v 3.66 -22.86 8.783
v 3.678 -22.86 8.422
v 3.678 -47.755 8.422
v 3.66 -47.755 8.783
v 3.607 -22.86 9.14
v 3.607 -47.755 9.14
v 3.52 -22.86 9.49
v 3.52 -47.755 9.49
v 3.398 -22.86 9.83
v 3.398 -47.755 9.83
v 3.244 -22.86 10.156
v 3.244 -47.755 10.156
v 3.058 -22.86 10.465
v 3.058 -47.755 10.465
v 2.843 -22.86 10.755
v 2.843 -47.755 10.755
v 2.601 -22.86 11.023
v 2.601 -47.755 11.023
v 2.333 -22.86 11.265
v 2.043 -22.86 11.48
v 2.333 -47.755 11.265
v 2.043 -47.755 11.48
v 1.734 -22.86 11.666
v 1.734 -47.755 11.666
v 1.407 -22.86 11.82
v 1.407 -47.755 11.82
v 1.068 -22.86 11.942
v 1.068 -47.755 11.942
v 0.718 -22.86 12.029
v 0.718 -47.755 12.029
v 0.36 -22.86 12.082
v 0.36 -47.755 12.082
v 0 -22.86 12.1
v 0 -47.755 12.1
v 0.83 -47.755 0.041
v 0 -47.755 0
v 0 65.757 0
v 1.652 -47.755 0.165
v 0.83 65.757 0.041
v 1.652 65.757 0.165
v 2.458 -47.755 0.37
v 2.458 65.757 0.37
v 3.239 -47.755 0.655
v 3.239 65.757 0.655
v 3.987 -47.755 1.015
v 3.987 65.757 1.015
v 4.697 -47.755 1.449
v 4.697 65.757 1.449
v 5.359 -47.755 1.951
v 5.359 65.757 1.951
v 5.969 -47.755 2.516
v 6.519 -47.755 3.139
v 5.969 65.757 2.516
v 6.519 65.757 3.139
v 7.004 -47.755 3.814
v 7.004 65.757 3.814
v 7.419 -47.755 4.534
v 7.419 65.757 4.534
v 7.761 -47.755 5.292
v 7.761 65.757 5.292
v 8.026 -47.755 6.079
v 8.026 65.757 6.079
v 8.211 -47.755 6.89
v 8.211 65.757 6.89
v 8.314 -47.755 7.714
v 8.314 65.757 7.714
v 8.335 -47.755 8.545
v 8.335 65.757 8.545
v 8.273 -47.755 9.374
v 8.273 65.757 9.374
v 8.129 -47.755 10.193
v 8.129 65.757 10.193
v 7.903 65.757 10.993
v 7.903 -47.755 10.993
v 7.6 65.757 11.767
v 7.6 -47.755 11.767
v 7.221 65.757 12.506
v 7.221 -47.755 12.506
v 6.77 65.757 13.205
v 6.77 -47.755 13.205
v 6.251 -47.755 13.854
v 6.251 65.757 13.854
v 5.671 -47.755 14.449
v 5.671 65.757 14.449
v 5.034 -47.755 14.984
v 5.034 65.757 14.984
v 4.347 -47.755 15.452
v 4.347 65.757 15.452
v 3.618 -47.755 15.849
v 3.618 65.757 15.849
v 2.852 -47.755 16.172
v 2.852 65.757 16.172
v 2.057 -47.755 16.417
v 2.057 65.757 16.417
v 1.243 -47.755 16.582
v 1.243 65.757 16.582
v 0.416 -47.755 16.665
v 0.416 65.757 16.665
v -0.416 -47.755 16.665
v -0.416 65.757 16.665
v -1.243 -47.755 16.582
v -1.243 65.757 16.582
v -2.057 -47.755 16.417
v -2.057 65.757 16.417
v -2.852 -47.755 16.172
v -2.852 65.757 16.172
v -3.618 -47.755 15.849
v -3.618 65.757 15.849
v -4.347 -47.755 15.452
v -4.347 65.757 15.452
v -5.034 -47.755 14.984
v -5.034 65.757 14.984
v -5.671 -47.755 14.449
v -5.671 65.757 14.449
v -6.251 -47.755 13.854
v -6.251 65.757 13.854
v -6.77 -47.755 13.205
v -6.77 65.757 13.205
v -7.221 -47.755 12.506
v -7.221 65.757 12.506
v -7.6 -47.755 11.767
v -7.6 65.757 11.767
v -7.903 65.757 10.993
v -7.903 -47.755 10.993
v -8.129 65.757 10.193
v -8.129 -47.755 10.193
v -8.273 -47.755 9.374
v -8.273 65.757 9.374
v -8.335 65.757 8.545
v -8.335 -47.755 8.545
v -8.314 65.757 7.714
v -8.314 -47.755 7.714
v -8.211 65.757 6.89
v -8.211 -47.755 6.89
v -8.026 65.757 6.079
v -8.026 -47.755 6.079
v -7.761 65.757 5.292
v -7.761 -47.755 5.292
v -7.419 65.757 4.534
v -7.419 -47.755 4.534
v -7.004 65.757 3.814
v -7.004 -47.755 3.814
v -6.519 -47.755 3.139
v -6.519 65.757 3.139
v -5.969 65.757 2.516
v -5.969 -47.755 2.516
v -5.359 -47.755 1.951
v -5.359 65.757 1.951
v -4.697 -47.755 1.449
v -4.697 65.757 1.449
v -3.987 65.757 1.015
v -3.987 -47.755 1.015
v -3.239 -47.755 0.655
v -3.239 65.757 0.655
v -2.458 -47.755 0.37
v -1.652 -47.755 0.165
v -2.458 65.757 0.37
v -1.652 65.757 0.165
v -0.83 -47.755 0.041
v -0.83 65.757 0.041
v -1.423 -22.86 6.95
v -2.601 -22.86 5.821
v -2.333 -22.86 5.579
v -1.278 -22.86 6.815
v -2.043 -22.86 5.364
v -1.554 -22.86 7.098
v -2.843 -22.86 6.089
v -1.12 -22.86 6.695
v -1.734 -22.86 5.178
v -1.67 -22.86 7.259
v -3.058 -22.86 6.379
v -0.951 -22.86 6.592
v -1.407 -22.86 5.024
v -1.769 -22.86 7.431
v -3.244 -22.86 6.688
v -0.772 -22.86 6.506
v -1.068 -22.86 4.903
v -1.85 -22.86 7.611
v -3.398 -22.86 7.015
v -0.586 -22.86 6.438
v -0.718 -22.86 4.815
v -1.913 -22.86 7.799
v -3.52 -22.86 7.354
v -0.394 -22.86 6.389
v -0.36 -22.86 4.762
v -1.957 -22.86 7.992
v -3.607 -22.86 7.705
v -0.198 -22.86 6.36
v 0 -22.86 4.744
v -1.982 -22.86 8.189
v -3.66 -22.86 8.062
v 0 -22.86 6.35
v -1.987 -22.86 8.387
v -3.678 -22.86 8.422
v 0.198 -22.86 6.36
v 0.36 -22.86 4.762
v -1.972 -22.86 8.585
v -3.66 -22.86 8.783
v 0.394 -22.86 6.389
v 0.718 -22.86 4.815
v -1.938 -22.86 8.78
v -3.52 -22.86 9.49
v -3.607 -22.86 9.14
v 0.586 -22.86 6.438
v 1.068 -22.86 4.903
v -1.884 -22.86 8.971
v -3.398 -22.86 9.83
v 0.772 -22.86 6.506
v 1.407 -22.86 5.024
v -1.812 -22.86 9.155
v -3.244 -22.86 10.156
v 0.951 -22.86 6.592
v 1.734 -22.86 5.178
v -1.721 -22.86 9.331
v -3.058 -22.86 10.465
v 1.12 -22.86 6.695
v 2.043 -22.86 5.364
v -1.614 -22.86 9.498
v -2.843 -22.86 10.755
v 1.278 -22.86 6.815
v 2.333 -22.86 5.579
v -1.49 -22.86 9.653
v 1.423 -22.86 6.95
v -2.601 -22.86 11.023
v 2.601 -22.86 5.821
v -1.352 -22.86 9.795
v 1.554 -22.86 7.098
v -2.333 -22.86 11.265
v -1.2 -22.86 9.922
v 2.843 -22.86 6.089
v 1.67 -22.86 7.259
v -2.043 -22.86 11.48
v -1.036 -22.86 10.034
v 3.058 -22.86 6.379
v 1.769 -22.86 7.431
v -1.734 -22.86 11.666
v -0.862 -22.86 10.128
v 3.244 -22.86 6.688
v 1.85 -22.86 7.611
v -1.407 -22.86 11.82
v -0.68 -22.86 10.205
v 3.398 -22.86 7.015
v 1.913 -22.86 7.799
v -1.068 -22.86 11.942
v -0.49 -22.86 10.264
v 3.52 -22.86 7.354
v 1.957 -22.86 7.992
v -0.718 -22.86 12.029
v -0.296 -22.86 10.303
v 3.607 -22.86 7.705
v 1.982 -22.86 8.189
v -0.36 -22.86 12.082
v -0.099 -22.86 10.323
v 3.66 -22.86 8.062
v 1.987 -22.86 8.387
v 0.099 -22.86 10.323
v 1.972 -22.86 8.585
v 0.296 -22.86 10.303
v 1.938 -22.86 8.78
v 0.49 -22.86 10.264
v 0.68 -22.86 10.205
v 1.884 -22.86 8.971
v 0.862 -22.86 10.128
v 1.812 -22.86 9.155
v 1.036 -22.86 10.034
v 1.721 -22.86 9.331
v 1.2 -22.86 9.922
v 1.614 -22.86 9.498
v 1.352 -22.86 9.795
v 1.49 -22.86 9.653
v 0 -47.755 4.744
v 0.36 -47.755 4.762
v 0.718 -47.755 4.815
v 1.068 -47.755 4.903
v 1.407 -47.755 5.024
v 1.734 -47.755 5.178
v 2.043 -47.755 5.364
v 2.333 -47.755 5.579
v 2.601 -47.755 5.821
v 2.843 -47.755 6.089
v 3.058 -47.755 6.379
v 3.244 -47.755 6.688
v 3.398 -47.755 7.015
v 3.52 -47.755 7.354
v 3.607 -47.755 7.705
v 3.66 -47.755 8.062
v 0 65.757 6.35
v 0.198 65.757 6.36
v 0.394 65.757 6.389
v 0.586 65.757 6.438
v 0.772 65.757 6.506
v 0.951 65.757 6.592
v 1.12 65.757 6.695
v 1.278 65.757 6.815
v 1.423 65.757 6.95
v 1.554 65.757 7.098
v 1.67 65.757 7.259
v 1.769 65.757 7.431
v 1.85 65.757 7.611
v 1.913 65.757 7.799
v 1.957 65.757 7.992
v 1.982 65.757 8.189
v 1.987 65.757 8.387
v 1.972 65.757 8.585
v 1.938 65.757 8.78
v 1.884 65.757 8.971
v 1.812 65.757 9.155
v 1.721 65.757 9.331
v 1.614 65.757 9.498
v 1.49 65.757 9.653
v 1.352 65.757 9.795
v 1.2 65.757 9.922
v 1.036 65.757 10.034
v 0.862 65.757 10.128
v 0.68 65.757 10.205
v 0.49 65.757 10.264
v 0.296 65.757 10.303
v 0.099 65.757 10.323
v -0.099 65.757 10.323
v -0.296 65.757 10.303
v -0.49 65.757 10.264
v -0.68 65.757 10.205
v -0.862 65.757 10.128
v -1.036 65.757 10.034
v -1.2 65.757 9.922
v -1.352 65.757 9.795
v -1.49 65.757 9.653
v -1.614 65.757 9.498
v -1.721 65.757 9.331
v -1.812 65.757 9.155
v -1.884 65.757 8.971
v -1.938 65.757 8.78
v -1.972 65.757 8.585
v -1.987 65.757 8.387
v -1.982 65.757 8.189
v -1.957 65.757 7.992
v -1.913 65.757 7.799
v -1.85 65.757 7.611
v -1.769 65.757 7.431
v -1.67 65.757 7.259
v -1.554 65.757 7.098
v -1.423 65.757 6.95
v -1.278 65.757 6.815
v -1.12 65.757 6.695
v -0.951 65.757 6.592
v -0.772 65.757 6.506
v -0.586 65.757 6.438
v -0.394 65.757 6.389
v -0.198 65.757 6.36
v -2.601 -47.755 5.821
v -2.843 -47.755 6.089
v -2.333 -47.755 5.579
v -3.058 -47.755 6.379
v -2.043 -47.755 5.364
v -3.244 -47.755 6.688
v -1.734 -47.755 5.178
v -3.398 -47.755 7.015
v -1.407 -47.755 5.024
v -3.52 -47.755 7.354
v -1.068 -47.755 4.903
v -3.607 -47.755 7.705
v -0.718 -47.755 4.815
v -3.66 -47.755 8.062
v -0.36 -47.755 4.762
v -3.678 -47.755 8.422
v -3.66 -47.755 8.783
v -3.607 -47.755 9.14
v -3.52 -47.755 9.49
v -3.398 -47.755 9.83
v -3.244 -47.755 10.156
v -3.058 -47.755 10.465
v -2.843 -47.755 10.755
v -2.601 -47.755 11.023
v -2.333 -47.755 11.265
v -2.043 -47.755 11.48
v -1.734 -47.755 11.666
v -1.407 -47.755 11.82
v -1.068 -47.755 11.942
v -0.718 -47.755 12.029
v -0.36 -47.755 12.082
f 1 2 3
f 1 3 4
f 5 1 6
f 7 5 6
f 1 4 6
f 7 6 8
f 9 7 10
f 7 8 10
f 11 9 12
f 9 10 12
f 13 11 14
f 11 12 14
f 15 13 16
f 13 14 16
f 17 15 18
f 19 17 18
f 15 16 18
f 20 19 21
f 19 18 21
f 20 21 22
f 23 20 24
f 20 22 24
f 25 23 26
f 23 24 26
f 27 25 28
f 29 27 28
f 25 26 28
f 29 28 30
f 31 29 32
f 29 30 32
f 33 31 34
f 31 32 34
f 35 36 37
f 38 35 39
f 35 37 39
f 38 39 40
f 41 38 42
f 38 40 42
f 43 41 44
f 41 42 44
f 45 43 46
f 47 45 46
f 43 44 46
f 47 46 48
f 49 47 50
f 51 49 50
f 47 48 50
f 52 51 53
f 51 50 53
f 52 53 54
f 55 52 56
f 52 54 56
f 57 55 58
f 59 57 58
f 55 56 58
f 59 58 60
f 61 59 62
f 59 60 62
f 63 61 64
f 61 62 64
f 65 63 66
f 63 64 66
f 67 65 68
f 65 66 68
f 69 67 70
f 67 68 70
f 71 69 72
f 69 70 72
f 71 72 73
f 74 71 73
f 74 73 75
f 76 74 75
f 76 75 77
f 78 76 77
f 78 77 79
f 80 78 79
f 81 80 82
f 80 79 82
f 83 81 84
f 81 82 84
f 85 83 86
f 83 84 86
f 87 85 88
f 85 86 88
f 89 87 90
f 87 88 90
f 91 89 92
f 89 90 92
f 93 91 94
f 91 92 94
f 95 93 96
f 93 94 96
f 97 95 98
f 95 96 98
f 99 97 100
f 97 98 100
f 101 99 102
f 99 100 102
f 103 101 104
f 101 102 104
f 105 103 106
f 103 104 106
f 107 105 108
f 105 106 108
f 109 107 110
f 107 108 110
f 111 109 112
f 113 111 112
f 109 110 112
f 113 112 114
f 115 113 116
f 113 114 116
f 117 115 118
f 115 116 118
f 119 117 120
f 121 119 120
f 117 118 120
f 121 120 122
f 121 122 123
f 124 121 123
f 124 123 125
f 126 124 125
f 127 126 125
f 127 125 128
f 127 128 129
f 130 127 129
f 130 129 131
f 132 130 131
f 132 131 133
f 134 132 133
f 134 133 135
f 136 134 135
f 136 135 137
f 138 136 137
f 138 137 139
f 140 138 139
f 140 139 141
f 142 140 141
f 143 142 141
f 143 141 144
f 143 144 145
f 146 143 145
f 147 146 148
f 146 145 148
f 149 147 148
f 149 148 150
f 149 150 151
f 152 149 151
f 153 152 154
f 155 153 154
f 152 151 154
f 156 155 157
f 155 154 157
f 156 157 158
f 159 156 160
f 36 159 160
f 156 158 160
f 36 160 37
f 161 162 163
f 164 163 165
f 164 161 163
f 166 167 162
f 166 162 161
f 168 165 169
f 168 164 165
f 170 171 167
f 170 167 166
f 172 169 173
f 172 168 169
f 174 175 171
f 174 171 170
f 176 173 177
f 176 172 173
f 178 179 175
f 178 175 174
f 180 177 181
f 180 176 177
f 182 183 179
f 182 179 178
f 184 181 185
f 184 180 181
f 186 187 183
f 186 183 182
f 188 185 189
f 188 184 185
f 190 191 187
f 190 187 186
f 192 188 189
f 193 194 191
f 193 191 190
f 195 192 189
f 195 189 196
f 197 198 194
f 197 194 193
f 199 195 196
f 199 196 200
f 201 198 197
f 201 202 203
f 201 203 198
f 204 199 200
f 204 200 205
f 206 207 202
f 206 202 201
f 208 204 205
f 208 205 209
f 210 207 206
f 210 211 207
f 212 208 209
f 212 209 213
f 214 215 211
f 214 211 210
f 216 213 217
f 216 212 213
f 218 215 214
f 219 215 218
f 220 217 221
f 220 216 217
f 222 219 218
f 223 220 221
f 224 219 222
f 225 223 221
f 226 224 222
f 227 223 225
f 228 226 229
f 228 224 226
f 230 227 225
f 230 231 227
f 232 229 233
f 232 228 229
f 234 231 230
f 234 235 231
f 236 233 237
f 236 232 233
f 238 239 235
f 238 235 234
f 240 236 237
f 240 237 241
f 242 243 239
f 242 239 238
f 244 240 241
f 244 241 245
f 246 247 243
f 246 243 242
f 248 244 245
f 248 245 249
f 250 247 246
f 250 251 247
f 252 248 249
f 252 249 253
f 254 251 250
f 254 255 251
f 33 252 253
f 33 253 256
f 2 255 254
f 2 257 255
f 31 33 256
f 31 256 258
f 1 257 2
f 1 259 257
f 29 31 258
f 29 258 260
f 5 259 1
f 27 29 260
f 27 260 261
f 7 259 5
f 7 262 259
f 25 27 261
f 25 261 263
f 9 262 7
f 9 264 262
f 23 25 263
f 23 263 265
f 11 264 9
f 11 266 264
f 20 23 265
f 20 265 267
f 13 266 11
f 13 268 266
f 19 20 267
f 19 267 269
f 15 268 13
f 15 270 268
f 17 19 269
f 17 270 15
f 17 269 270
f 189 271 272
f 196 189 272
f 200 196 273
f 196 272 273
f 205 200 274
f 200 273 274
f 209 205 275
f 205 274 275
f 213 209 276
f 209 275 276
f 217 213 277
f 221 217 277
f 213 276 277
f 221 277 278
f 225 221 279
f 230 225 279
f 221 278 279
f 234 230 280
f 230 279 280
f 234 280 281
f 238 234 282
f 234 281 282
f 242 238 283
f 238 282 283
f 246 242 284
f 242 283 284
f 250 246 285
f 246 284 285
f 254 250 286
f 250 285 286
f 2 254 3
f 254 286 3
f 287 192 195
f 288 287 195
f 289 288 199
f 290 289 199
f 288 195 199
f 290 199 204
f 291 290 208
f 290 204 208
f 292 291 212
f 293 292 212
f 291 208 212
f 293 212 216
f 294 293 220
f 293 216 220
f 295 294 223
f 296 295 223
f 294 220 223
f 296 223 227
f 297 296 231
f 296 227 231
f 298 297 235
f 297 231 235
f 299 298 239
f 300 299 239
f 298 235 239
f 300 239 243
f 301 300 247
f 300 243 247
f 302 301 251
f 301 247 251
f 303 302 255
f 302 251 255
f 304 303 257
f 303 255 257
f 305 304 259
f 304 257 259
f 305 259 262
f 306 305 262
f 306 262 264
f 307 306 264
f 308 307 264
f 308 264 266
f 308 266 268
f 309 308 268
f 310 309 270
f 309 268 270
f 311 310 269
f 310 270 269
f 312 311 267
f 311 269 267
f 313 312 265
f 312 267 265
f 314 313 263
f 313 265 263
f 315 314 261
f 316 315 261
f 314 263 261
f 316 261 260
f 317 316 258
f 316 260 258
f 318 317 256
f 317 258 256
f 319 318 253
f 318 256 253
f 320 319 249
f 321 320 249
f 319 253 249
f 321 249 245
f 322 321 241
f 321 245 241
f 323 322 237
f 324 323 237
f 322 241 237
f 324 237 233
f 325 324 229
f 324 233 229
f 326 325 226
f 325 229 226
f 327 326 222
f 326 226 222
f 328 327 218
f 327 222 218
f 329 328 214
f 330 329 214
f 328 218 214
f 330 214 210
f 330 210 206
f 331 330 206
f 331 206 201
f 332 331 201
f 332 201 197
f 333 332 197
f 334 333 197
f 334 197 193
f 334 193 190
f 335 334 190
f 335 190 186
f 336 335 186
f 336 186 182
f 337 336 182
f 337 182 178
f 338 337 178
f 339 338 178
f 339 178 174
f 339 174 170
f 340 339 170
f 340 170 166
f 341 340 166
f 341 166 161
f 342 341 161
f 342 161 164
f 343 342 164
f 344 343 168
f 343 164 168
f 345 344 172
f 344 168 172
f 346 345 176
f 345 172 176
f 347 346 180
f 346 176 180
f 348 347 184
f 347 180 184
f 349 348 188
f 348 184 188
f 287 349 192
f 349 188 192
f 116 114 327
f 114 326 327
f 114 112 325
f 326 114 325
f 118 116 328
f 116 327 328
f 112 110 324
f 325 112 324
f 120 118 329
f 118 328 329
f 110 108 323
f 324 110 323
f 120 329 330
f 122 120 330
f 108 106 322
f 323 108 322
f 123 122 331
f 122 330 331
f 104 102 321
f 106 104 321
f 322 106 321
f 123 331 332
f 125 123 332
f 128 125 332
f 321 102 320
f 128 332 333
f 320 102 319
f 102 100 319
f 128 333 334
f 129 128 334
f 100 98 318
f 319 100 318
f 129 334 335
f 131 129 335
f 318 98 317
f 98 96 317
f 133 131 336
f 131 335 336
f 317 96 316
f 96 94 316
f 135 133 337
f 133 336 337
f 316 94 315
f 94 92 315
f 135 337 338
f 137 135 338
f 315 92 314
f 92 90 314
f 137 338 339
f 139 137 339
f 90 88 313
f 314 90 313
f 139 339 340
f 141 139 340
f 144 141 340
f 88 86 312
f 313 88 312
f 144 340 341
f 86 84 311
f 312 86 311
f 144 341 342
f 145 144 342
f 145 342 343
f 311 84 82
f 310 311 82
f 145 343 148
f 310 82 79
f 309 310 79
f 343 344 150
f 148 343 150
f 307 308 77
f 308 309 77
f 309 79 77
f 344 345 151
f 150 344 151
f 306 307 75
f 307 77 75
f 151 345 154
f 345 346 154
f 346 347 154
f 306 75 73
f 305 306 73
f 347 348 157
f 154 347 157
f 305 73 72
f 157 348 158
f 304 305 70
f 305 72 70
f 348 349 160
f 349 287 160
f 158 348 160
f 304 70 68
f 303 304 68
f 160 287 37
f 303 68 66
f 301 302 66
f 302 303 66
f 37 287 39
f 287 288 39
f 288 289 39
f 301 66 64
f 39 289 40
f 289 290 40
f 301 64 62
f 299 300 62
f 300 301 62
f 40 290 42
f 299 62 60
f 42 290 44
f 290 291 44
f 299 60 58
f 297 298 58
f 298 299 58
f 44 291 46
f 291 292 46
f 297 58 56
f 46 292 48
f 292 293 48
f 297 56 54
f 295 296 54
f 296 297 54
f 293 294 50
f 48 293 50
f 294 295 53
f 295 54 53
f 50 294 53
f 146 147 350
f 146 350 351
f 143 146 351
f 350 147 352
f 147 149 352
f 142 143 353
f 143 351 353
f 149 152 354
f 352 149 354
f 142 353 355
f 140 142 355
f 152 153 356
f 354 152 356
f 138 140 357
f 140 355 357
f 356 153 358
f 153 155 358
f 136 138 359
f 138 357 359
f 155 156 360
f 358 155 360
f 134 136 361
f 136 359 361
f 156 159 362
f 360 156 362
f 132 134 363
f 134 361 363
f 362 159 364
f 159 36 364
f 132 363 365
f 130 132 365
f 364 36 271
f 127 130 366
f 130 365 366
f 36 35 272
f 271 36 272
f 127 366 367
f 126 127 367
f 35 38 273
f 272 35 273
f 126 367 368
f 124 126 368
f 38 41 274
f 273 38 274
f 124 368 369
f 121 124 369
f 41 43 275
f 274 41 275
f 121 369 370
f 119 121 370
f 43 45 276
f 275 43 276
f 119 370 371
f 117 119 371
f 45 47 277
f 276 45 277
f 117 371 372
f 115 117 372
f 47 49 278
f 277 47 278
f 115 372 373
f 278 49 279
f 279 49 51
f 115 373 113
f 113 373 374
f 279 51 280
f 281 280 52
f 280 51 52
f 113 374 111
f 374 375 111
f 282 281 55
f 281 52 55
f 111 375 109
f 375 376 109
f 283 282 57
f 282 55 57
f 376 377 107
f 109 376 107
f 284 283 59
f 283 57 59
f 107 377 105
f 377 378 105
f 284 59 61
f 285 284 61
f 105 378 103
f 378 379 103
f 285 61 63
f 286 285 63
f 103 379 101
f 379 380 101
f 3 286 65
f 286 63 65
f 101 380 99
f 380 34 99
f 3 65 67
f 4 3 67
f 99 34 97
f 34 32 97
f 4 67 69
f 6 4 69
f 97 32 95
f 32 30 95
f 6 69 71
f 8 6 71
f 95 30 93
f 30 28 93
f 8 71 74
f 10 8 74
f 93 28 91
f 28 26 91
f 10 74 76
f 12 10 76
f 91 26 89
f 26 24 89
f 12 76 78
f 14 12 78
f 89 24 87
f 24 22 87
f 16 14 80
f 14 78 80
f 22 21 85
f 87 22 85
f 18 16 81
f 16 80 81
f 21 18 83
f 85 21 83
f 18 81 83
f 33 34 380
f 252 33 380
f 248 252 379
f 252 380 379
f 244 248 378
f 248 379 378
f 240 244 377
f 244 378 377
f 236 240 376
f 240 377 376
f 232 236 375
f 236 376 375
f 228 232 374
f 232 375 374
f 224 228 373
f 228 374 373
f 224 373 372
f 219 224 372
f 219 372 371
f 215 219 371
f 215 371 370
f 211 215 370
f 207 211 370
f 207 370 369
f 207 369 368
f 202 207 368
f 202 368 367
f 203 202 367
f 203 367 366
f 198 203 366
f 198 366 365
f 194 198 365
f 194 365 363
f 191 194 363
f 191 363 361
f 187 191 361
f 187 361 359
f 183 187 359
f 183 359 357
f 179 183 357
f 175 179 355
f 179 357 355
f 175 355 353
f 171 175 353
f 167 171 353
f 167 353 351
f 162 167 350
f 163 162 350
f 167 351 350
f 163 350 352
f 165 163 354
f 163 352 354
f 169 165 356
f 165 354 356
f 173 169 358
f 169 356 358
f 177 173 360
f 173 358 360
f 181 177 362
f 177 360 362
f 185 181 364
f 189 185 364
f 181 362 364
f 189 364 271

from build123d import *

# Parameters (mm, degrees)
F4_DEPTH = 25.4


with BuildPart() as f1:
    # F0 (on Right) → F1 (revolve)
    with BuildSketch(Plane.YZ):
        Polygon((-47.755392, 8.33755), (-47.755392, 0), (65.757208, 0), (65.757208, 6.35), (-43.792992, 6.35), (-43.792992, 8.33755), align=None)
    revolve(axis=Axis((0, -45.774192, 8.33755), (0, -1, 0)))

    # F3 (on offset) → F4 (cut)
    with BuildSketch(Plane.XZ.offset(48.26)):
        with BuildLine():
            ThreePointArc((0, 12.10002), (-3.677915, 8.422106), (0, 4.744191))
            Line((0, 4.744191), (0, 8.422106))
            Line((0, 8.422106), (0, 12.10002))
        make_face()
        with BuildLine():
            Line((0, 8.422106), (0, 4.744191))
            ThreePointArc((0, 4.744191), (2.600678, 5.821427), (3.677915, 8.422106))
            ThreePointArc((3.677915, 8.422106), (2.600678, 11.022784), (0, 12.10002))
            Line((0, 12.10002), (0, 8.422106))
        make_face()
    extrude(amount=-F4_DEPTH, mode=Mode.SUBTRACT)


solid = f1.part
